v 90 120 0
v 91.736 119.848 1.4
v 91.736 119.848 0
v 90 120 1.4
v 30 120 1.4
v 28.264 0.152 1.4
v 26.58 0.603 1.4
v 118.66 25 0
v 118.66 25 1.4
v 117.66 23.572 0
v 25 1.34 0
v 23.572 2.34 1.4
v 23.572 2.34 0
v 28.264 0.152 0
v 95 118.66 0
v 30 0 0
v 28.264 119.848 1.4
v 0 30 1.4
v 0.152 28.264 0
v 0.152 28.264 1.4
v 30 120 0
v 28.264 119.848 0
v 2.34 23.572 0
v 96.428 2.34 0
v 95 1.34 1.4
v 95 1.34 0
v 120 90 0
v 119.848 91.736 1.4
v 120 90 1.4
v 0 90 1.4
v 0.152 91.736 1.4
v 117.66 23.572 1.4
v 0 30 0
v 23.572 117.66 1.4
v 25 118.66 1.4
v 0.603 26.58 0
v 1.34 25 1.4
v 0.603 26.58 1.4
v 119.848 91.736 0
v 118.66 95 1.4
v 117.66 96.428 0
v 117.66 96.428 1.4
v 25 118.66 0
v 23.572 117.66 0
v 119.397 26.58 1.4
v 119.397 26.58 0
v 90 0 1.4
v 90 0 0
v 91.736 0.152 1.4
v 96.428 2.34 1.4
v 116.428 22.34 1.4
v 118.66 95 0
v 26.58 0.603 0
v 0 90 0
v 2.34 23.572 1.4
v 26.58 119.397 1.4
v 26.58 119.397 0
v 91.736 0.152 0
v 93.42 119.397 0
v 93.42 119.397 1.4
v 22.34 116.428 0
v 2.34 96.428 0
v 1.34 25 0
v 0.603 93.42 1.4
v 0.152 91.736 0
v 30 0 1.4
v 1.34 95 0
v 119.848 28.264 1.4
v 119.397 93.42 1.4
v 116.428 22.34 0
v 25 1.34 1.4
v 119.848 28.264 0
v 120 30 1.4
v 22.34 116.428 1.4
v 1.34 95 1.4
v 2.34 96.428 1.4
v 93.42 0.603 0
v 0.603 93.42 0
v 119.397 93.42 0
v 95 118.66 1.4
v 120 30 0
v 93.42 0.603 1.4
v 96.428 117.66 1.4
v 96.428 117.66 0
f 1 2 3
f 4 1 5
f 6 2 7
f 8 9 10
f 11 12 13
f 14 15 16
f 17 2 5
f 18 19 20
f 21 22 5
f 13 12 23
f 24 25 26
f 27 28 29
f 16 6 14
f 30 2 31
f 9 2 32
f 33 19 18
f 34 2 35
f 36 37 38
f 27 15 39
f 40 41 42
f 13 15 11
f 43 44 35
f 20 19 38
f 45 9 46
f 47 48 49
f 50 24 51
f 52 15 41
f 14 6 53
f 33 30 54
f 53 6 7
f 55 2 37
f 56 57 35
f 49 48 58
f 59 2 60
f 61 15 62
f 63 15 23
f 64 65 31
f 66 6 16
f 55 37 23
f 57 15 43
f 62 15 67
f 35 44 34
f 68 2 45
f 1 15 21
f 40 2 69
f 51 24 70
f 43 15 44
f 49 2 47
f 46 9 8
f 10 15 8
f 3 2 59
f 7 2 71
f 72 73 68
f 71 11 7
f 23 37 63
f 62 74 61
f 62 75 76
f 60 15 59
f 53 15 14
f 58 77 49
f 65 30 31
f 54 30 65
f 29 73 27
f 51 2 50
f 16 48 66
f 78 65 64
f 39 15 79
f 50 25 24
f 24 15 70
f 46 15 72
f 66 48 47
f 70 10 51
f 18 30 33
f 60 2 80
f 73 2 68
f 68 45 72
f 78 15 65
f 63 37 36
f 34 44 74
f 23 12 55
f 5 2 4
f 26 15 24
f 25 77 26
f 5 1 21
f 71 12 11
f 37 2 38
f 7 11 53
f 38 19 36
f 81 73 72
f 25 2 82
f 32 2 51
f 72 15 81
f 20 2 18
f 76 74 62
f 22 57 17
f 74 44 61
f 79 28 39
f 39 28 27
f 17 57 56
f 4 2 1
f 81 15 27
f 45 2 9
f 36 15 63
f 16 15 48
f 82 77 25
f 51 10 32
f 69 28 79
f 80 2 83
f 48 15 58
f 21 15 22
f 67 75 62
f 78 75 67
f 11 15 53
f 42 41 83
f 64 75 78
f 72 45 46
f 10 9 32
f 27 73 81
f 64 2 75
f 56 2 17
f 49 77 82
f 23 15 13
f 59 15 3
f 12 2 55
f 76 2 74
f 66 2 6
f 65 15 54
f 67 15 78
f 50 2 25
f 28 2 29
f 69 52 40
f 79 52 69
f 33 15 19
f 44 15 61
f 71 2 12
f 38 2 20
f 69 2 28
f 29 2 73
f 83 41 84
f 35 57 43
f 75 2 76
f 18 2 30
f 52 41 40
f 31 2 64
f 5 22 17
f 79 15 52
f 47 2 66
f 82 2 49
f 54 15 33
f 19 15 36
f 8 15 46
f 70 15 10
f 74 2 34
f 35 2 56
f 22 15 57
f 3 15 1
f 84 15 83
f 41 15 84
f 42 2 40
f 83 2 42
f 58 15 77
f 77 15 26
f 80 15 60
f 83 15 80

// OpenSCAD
a = 120; // Square size
b = 10; // radius of corners
w = 0.4; // Width of line
h = 1.4; // Height of wall
$fn=36;

hull() {
    translate([3*b,b,0]) cylinder(h, r=b);
    translate([b,3*b,0]) cylinder(h, r=b);
    translate([a-3*b,b,0]) cylinder(h, r=b);
    translate([a-b,3*b,0]) cylinder(h, r=b);
    translate([3*b,a-b,0]) cylinder(h, r=b);
    translate([b,a-3*b,0]) cylinder(h, r=b);
    translate([a-3*b,a-b,0]) cylinder(h, r=b);
    translate([a-b,a-3*b,0]) cylinder(h, r=b);
}
